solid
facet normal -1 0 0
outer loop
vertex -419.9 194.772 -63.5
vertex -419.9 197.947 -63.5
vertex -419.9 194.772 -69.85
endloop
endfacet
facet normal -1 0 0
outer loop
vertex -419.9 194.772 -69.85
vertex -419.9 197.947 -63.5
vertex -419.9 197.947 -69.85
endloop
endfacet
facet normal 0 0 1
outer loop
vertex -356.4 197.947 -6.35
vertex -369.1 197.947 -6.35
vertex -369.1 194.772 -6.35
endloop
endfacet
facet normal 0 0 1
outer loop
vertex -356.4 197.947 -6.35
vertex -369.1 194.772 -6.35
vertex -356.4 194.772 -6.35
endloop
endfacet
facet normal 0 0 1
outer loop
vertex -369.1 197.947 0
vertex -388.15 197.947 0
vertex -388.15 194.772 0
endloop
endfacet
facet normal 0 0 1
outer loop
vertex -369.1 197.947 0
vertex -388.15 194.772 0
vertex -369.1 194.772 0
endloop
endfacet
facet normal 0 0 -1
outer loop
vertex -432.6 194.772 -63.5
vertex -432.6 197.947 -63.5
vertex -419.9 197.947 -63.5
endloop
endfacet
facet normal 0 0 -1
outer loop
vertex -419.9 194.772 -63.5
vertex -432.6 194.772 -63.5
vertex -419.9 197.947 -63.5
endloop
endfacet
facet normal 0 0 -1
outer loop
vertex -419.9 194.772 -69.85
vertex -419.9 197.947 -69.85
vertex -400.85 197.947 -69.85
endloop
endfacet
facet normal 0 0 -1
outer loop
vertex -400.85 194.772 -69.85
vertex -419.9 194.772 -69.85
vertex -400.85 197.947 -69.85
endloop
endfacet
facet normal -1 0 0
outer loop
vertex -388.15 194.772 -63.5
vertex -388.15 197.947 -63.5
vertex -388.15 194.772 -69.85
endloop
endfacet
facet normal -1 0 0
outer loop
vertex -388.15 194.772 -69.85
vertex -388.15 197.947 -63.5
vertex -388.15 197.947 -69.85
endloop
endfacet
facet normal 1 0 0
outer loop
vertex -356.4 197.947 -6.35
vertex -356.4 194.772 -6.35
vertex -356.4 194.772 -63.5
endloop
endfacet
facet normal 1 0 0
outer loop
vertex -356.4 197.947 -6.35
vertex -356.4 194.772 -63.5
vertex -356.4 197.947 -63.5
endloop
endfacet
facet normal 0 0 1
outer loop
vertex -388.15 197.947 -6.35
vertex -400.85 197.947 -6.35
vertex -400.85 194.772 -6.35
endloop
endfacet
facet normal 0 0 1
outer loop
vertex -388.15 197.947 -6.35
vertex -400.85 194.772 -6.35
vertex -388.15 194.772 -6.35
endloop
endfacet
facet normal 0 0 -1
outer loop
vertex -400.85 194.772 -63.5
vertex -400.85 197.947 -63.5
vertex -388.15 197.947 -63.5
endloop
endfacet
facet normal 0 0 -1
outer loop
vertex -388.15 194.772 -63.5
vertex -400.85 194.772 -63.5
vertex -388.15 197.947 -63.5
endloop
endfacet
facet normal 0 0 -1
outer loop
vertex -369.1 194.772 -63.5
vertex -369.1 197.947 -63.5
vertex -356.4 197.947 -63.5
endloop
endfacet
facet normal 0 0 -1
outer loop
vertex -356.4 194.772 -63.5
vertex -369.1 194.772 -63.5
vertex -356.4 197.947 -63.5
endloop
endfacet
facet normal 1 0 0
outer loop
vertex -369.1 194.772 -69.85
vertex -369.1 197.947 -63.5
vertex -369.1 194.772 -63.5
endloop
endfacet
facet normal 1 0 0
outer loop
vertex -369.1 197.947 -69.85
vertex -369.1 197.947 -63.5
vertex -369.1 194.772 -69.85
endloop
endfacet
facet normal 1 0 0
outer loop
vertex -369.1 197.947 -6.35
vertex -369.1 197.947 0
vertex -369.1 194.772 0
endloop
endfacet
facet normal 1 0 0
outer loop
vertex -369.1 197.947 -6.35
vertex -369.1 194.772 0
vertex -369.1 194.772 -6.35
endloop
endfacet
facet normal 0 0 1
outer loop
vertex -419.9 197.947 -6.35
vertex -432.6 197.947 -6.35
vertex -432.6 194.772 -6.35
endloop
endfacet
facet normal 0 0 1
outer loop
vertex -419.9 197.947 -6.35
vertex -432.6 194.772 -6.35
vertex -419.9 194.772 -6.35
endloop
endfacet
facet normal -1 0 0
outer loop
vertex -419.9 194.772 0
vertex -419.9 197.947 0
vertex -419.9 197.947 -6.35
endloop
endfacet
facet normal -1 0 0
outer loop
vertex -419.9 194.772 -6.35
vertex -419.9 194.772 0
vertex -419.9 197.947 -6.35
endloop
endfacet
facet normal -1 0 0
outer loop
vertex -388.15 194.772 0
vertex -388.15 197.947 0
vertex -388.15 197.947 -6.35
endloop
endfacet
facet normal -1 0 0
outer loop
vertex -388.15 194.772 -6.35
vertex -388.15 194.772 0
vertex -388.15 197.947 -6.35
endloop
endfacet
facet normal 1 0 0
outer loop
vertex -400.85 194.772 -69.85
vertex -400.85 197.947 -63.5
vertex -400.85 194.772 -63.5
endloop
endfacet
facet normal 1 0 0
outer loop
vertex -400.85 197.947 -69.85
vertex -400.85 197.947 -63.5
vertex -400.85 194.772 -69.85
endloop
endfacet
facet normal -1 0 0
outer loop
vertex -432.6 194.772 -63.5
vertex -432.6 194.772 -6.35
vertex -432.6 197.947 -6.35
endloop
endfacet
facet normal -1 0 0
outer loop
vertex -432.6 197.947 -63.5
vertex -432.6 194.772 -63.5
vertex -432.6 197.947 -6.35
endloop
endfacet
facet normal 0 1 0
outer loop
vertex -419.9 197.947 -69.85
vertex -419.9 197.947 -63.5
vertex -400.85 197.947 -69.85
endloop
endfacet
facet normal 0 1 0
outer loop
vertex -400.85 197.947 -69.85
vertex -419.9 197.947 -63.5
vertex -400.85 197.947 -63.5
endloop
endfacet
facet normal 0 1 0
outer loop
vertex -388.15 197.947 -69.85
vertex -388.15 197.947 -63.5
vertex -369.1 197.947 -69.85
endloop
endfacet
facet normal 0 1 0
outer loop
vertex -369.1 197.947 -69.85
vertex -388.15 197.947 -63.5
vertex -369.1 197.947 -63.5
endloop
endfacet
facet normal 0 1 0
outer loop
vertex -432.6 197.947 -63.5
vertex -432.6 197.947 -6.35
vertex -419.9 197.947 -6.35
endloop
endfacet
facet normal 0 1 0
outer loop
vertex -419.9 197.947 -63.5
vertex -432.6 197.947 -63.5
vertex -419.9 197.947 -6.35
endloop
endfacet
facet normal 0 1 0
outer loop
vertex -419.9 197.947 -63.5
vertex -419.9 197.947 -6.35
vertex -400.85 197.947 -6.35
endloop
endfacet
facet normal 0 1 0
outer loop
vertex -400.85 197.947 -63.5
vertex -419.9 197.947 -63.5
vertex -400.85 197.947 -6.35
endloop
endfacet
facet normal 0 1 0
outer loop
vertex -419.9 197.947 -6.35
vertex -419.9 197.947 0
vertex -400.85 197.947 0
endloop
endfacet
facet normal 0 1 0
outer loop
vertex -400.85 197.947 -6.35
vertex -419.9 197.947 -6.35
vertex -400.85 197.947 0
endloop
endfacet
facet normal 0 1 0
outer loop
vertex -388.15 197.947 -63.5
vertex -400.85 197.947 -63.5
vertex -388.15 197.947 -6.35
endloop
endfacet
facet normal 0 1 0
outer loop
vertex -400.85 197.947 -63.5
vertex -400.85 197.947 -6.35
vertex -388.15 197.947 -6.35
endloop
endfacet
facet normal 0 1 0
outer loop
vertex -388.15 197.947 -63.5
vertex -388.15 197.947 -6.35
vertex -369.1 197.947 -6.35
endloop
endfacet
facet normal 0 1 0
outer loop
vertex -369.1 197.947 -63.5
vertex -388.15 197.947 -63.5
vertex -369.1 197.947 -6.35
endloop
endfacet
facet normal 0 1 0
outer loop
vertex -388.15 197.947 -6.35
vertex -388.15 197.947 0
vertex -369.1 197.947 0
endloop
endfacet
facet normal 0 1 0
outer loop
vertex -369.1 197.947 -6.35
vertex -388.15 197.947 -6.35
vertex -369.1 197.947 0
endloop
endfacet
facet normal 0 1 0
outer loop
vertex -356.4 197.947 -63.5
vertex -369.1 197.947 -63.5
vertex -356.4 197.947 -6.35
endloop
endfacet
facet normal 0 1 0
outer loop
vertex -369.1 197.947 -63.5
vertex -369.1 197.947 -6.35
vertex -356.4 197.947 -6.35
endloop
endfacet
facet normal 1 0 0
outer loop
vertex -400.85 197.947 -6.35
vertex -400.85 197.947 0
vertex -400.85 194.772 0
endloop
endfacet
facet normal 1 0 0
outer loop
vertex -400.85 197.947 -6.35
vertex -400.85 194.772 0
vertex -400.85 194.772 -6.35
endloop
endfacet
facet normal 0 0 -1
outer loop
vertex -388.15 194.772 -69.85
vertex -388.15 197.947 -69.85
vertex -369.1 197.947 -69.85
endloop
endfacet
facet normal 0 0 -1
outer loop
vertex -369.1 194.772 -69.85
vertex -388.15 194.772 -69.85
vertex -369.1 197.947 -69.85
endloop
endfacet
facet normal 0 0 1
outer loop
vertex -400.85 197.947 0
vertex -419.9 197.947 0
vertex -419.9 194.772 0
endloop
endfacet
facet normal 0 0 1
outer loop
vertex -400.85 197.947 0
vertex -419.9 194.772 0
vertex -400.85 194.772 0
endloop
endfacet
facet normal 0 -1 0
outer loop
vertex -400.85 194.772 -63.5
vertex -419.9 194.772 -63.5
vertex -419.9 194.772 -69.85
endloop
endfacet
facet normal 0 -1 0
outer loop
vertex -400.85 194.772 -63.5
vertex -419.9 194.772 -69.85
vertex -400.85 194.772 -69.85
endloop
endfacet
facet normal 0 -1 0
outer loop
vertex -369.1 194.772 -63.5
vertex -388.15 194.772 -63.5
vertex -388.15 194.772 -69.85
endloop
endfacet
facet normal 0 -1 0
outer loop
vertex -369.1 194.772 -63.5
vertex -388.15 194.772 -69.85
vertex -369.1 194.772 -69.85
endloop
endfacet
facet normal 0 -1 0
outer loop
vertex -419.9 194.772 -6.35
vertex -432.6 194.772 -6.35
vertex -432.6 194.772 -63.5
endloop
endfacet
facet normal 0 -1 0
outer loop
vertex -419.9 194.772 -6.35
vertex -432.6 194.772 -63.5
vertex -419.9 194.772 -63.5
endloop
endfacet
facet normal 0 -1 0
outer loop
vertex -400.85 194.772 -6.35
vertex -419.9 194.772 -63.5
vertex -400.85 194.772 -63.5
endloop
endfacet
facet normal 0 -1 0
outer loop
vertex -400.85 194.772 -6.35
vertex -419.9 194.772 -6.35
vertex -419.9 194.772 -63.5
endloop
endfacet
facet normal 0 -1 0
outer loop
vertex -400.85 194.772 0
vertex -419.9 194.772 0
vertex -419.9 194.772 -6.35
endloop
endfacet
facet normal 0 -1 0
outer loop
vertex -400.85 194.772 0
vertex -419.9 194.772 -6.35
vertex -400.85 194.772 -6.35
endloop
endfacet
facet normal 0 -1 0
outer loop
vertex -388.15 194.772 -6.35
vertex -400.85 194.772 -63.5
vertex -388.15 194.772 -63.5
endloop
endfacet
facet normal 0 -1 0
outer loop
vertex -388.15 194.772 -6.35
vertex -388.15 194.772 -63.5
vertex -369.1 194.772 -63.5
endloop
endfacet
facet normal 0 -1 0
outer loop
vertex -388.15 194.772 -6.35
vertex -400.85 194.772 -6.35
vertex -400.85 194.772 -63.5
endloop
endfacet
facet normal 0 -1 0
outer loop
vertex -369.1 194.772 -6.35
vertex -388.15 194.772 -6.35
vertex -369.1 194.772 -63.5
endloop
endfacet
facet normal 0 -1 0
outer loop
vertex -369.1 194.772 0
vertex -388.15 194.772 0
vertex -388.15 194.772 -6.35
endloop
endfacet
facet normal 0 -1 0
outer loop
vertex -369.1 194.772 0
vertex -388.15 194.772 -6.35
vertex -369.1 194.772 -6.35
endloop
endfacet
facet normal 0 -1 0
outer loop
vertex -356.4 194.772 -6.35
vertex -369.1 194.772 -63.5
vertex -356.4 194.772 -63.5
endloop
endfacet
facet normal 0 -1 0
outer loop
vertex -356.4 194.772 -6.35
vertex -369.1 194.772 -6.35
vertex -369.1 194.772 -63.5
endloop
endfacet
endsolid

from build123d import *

# Parameters (mm, degrees)
SKETCH1_W           = 76.2
SKETCH1_H           = 3.175
BOSS_EXTRUDE1_DEPTH = 69.85
SKETCH2_W           = 12.7
SKETCH2_H           = 6.35
CUT_EXTRUDE1_DEPTH  = 439.214737942


with BuildPart() as part:
    # Sketch1 → Boss-Extrude1 (new body)
    with BuildSketch(Plane.XY):
        with Locations((-394.500339141, 196.359630659)):
            Rectangle(SKETCH1_W, SKETCH1_H)
    extrude(amount=-BOSS_EXTRUDE1_DEPTH)

    # Sketch2 → Cut-Extrude1 (cut, through all)
    with BuildSketch(Plane(origin=(0, 197.947130659, 0), x_dir=(1, 0, 0), z_dir=(0, 1, 0))):
        with Locations((-362.750339141, 3.175)):
            Rectangle(SKETCH2_W, SKETCH2_H)
        with Locations((-394.500339141, 3.175)):
            Rectangle(SKETCH2_W, SKETCH2_H)
        with Locations((-426.250339141, 3.175)):
            Rectangle(SKETCH2_W, SKETCH2_H)
        with Locations((-362.750339141, 66.675)):
            Rectangle(SKETCH2_W, SKETCH2_H)
        with Locations((-394.500339141, 66.675)):
            Rectangle(SKETCH2_W, SKETCH2_H)
        with Locations((-426.250339141, 66.675)):
            Rectangle(SKETCH2_W, SKETCH2_H)
    extrude(amount=-CUT_EXTRUDE1_DEPTH, mode=Mode.SUBTRACT)


solid = part.part
